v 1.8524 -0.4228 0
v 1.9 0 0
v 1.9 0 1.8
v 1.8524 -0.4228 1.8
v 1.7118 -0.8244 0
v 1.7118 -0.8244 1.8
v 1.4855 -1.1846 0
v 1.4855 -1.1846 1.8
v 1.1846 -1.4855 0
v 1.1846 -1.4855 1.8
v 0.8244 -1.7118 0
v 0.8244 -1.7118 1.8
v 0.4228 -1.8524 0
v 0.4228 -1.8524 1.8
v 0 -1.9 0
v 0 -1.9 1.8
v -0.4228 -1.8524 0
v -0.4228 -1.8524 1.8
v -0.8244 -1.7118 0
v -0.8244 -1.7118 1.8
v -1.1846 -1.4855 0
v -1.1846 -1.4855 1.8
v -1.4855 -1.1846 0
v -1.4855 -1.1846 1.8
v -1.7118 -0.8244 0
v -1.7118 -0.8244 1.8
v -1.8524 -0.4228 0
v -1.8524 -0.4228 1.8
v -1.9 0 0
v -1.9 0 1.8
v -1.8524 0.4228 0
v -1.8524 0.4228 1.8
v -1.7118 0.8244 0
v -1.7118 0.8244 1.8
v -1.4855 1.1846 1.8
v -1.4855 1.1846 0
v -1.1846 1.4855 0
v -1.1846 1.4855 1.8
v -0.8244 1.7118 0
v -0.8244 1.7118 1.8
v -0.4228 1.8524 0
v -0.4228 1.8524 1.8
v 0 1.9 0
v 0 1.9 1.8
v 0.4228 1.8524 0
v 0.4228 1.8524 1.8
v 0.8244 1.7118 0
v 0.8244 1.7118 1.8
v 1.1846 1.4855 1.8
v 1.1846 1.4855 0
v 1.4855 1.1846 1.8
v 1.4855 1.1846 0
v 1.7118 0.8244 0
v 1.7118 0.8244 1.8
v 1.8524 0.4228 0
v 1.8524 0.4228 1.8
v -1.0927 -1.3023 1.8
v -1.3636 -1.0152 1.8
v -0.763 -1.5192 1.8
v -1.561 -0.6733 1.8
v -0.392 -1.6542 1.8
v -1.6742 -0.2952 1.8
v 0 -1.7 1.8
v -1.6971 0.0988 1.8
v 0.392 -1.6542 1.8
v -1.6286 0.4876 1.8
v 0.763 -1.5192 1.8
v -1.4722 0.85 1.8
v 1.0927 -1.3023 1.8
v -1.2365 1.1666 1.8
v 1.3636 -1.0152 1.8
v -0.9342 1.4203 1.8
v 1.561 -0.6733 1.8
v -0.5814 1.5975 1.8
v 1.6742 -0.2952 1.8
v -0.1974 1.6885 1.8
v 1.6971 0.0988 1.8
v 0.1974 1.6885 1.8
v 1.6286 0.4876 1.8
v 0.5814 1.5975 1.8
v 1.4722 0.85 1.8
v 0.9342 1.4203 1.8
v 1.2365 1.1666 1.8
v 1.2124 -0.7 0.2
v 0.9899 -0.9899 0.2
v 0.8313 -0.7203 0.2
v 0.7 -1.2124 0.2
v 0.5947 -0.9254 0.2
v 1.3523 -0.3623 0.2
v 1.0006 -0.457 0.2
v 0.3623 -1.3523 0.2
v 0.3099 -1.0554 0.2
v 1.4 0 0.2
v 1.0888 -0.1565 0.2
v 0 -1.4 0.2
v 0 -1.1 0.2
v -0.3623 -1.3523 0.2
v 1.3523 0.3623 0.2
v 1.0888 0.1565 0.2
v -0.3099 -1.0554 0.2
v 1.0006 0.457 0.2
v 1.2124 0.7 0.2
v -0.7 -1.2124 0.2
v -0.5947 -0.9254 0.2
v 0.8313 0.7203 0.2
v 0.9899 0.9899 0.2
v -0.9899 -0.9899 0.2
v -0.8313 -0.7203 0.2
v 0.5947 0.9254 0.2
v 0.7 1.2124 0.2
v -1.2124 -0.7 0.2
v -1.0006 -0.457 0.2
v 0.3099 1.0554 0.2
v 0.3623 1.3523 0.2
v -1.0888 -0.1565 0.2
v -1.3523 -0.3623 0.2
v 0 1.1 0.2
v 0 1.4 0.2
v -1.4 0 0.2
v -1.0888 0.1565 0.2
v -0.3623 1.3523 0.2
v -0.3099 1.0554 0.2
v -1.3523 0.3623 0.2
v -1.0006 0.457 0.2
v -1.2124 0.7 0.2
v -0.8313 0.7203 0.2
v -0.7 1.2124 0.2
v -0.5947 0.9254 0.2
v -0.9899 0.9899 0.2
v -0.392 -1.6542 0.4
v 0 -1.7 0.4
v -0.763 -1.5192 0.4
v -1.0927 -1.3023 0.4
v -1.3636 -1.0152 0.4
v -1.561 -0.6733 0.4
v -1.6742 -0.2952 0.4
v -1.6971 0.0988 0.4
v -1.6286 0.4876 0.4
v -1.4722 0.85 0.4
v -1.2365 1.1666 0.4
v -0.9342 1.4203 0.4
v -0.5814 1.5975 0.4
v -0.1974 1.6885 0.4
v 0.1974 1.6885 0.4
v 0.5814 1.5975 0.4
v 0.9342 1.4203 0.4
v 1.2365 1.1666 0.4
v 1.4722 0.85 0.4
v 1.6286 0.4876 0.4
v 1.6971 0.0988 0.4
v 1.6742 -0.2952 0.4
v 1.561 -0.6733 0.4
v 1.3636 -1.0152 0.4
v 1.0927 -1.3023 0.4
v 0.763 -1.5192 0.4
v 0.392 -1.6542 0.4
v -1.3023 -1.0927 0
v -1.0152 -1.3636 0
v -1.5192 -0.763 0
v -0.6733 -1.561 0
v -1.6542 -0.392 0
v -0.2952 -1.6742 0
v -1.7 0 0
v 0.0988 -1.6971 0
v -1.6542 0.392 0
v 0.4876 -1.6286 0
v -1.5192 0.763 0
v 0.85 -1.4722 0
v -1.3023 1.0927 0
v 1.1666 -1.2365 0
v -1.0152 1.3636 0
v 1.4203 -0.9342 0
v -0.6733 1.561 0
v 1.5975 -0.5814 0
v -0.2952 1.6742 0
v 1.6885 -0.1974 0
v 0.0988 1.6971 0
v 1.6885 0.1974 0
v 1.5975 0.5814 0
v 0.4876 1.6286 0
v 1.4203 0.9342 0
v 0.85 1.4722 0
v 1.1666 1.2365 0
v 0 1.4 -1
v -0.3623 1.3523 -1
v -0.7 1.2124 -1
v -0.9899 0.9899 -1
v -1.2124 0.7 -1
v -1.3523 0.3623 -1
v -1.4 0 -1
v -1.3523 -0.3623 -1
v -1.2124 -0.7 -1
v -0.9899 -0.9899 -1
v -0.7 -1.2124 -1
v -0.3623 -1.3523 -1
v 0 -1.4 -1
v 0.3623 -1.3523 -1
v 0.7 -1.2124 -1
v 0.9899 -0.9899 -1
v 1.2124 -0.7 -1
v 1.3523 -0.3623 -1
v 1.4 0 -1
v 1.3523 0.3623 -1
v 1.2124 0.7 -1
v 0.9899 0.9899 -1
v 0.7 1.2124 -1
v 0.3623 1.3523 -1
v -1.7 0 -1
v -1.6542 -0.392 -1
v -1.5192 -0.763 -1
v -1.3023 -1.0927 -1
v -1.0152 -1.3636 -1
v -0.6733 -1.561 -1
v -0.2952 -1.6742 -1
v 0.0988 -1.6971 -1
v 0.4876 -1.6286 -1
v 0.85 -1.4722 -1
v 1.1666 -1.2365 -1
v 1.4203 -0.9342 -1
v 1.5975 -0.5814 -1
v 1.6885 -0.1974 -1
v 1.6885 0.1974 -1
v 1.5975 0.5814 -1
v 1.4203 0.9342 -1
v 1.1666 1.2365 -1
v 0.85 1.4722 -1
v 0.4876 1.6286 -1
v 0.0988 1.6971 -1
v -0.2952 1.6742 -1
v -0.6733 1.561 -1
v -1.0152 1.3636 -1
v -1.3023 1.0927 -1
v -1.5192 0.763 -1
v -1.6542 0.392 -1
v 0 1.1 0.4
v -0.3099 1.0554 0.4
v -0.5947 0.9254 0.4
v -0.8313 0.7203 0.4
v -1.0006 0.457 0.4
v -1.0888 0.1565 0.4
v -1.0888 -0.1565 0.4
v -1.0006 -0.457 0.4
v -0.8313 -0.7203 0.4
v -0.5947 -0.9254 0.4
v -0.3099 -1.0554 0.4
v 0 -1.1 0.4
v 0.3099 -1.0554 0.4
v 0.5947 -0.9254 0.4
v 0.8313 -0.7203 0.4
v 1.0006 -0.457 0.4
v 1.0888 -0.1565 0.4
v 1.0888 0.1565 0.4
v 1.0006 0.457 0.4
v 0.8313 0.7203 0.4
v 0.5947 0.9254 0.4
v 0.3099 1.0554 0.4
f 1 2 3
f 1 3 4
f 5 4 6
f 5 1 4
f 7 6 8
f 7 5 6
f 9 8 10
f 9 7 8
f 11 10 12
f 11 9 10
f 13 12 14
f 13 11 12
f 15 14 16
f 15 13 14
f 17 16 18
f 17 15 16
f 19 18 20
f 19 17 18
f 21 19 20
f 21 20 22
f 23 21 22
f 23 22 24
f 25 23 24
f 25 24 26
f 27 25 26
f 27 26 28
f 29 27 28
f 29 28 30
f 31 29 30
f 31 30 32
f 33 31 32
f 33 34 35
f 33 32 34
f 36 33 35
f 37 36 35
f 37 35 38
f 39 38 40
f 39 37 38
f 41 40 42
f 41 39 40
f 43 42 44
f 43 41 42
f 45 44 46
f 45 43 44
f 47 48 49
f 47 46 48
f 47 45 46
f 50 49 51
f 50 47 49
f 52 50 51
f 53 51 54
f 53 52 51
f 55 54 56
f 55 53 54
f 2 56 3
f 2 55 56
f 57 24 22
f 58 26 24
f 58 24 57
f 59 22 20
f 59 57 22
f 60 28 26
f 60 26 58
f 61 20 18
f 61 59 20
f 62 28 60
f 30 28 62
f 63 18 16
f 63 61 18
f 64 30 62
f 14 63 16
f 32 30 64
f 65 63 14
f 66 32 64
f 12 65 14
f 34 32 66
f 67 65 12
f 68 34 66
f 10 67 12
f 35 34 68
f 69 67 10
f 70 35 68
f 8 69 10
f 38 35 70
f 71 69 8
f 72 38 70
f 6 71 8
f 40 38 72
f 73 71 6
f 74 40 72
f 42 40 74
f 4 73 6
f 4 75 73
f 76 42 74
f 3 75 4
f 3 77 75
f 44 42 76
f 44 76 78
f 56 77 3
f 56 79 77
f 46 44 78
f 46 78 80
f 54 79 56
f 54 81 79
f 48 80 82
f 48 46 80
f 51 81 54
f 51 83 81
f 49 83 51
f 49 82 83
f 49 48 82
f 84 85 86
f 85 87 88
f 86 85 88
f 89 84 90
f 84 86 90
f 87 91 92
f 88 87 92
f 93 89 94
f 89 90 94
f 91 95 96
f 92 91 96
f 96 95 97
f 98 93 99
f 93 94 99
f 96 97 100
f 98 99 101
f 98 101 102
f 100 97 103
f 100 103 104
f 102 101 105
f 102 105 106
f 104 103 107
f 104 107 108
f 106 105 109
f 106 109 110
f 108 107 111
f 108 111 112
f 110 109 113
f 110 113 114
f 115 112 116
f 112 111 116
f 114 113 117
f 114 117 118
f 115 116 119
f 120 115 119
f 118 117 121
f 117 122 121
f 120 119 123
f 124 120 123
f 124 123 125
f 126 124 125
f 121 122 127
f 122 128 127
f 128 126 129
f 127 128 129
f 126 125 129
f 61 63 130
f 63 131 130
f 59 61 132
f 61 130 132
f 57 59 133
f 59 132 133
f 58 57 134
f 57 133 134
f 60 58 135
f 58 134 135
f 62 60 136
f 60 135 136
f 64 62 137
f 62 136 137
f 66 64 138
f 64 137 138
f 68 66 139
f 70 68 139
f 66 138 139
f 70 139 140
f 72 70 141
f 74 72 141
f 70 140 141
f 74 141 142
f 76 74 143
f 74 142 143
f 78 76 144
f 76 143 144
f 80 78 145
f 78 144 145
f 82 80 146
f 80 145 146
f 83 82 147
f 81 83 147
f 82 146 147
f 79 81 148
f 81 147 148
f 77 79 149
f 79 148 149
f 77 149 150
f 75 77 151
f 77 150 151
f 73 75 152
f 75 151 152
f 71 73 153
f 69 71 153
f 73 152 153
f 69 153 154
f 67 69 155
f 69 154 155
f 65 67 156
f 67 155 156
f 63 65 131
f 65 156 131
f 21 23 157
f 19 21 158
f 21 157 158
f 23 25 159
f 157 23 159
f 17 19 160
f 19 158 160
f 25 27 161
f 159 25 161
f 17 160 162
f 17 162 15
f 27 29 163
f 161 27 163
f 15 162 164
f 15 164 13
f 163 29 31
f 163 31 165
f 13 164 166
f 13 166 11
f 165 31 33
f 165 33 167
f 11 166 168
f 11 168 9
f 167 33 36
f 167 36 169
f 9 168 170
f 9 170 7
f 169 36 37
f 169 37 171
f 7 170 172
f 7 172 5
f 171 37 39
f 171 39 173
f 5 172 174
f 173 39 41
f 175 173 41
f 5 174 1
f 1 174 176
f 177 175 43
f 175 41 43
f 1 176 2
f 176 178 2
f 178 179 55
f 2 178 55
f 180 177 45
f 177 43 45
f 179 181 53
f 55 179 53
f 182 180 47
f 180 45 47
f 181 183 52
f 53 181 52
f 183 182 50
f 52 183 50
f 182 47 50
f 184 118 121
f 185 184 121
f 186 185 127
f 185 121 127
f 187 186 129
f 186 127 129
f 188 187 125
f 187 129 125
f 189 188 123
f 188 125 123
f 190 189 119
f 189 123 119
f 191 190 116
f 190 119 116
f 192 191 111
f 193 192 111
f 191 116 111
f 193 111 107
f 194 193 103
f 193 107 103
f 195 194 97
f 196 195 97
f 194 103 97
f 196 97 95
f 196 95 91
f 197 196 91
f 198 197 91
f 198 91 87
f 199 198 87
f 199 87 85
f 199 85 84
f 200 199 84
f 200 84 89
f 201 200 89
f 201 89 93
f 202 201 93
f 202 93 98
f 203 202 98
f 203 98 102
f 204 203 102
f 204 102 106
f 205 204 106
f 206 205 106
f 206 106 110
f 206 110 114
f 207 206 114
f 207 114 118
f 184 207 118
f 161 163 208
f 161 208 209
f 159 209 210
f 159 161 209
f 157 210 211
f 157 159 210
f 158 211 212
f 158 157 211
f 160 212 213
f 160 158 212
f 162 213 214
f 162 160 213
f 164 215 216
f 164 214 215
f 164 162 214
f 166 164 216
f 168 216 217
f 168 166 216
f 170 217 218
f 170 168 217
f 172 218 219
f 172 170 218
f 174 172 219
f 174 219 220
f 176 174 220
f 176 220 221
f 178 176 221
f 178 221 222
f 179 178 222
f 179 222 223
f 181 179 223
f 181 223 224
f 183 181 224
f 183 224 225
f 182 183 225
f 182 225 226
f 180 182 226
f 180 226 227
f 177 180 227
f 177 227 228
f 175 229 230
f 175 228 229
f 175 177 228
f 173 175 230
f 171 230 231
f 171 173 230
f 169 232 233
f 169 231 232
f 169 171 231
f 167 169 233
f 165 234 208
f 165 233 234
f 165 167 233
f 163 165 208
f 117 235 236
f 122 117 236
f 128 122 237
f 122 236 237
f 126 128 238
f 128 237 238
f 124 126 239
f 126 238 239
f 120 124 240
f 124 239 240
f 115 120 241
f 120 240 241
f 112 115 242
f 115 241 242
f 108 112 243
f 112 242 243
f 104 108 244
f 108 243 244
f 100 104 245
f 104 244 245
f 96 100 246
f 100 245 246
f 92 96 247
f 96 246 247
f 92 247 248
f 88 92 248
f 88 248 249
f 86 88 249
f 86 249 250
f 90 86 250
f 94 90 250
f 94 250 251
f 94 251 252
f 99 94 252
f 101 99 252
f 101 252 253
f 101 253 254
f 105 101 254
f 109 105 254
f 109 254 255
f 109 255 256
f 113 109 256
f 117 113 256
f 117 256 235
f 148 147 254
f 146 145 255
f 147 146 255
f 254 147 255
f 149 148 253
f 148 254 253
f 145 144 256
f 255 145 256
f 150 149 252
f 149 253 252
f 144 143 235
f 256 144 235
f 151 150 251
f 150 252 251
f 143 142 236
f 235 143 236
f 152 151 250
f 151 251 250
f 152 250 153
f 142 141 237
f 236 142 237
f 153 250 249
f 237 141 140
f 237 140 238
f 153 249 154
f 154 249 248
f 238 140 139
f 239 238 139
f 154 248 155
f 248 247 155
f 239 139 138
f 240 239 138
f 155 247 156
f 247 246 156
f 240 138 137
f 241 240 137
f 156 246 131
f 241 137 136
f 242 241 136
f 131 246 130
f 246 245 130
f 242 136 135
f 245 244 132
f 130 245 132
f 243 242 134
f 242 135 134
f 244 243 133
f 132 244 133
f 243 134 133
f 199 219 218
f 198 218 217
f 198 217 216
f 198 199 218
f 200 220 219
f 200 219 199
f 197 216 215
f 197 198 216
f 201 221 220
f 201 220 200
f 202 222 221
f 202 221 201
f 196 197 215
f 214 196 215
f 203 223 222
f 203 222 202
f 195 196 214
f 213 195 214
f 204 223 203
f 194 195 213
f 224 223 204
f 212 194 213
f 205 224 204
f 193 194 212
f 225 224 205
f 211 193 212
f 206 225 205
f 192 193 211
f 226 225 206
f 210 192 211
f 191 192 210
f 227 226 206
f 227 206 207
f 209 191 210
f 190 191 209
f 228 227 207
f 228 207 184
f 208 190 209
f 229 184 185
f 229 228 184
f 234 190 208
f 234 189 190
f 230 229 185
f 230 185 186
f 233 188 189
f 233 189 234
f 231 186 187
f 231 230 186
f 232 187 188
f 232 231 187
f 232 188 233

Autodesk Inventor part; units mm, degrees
ref_plane "YZ Plane" through (0, 0, 0) normal (1, 0, 0) x (0, 1, 0)
ref_plane "XZ Plane" through (0, 0, 0) normal (0, 1, 0) x (-1, 0, 0)
ref_plane "XY Plane" through (0, 0, 0) normal (0, 0, 1) x (1, 0, 0)
sketch "Sketch1" plane through (0, 0, 0) normal (0, 0, 1) x (1, 0, 0)
  circle A0 centre (0, 0) radius 1.9
  dimension "d0" = 3.8
extrude "Extrusion1" add sketch "Sketch1" along normal blind 1.8
hole "Hole1" at (0, 0, 1.8) direction (0, 0, -1) diameter 3.4 depth 1.4
sketch "Sketch2" plane through (0, 0, 0) normal (0, 0, -1) x (-1, 0, 0)
  circle A0 centre (0, 0) radius 1.9 projected
  circle A1 centre (0, 0) radius 1.7
  dimension "d12" = 3.4
extrude "Extrusion2" add sketch "Sketch2" along normal blind 1 contours A1
hole "Hole2" at (0, 0, -1) direction (0, 0, 1) diameter 2.2 end through all
hole "Hole3" at (0, 0, -1) direction (0, 0, 1) diameter 2.8 depth 1.2
properties part number "MU_Bearing_Retainer2"
